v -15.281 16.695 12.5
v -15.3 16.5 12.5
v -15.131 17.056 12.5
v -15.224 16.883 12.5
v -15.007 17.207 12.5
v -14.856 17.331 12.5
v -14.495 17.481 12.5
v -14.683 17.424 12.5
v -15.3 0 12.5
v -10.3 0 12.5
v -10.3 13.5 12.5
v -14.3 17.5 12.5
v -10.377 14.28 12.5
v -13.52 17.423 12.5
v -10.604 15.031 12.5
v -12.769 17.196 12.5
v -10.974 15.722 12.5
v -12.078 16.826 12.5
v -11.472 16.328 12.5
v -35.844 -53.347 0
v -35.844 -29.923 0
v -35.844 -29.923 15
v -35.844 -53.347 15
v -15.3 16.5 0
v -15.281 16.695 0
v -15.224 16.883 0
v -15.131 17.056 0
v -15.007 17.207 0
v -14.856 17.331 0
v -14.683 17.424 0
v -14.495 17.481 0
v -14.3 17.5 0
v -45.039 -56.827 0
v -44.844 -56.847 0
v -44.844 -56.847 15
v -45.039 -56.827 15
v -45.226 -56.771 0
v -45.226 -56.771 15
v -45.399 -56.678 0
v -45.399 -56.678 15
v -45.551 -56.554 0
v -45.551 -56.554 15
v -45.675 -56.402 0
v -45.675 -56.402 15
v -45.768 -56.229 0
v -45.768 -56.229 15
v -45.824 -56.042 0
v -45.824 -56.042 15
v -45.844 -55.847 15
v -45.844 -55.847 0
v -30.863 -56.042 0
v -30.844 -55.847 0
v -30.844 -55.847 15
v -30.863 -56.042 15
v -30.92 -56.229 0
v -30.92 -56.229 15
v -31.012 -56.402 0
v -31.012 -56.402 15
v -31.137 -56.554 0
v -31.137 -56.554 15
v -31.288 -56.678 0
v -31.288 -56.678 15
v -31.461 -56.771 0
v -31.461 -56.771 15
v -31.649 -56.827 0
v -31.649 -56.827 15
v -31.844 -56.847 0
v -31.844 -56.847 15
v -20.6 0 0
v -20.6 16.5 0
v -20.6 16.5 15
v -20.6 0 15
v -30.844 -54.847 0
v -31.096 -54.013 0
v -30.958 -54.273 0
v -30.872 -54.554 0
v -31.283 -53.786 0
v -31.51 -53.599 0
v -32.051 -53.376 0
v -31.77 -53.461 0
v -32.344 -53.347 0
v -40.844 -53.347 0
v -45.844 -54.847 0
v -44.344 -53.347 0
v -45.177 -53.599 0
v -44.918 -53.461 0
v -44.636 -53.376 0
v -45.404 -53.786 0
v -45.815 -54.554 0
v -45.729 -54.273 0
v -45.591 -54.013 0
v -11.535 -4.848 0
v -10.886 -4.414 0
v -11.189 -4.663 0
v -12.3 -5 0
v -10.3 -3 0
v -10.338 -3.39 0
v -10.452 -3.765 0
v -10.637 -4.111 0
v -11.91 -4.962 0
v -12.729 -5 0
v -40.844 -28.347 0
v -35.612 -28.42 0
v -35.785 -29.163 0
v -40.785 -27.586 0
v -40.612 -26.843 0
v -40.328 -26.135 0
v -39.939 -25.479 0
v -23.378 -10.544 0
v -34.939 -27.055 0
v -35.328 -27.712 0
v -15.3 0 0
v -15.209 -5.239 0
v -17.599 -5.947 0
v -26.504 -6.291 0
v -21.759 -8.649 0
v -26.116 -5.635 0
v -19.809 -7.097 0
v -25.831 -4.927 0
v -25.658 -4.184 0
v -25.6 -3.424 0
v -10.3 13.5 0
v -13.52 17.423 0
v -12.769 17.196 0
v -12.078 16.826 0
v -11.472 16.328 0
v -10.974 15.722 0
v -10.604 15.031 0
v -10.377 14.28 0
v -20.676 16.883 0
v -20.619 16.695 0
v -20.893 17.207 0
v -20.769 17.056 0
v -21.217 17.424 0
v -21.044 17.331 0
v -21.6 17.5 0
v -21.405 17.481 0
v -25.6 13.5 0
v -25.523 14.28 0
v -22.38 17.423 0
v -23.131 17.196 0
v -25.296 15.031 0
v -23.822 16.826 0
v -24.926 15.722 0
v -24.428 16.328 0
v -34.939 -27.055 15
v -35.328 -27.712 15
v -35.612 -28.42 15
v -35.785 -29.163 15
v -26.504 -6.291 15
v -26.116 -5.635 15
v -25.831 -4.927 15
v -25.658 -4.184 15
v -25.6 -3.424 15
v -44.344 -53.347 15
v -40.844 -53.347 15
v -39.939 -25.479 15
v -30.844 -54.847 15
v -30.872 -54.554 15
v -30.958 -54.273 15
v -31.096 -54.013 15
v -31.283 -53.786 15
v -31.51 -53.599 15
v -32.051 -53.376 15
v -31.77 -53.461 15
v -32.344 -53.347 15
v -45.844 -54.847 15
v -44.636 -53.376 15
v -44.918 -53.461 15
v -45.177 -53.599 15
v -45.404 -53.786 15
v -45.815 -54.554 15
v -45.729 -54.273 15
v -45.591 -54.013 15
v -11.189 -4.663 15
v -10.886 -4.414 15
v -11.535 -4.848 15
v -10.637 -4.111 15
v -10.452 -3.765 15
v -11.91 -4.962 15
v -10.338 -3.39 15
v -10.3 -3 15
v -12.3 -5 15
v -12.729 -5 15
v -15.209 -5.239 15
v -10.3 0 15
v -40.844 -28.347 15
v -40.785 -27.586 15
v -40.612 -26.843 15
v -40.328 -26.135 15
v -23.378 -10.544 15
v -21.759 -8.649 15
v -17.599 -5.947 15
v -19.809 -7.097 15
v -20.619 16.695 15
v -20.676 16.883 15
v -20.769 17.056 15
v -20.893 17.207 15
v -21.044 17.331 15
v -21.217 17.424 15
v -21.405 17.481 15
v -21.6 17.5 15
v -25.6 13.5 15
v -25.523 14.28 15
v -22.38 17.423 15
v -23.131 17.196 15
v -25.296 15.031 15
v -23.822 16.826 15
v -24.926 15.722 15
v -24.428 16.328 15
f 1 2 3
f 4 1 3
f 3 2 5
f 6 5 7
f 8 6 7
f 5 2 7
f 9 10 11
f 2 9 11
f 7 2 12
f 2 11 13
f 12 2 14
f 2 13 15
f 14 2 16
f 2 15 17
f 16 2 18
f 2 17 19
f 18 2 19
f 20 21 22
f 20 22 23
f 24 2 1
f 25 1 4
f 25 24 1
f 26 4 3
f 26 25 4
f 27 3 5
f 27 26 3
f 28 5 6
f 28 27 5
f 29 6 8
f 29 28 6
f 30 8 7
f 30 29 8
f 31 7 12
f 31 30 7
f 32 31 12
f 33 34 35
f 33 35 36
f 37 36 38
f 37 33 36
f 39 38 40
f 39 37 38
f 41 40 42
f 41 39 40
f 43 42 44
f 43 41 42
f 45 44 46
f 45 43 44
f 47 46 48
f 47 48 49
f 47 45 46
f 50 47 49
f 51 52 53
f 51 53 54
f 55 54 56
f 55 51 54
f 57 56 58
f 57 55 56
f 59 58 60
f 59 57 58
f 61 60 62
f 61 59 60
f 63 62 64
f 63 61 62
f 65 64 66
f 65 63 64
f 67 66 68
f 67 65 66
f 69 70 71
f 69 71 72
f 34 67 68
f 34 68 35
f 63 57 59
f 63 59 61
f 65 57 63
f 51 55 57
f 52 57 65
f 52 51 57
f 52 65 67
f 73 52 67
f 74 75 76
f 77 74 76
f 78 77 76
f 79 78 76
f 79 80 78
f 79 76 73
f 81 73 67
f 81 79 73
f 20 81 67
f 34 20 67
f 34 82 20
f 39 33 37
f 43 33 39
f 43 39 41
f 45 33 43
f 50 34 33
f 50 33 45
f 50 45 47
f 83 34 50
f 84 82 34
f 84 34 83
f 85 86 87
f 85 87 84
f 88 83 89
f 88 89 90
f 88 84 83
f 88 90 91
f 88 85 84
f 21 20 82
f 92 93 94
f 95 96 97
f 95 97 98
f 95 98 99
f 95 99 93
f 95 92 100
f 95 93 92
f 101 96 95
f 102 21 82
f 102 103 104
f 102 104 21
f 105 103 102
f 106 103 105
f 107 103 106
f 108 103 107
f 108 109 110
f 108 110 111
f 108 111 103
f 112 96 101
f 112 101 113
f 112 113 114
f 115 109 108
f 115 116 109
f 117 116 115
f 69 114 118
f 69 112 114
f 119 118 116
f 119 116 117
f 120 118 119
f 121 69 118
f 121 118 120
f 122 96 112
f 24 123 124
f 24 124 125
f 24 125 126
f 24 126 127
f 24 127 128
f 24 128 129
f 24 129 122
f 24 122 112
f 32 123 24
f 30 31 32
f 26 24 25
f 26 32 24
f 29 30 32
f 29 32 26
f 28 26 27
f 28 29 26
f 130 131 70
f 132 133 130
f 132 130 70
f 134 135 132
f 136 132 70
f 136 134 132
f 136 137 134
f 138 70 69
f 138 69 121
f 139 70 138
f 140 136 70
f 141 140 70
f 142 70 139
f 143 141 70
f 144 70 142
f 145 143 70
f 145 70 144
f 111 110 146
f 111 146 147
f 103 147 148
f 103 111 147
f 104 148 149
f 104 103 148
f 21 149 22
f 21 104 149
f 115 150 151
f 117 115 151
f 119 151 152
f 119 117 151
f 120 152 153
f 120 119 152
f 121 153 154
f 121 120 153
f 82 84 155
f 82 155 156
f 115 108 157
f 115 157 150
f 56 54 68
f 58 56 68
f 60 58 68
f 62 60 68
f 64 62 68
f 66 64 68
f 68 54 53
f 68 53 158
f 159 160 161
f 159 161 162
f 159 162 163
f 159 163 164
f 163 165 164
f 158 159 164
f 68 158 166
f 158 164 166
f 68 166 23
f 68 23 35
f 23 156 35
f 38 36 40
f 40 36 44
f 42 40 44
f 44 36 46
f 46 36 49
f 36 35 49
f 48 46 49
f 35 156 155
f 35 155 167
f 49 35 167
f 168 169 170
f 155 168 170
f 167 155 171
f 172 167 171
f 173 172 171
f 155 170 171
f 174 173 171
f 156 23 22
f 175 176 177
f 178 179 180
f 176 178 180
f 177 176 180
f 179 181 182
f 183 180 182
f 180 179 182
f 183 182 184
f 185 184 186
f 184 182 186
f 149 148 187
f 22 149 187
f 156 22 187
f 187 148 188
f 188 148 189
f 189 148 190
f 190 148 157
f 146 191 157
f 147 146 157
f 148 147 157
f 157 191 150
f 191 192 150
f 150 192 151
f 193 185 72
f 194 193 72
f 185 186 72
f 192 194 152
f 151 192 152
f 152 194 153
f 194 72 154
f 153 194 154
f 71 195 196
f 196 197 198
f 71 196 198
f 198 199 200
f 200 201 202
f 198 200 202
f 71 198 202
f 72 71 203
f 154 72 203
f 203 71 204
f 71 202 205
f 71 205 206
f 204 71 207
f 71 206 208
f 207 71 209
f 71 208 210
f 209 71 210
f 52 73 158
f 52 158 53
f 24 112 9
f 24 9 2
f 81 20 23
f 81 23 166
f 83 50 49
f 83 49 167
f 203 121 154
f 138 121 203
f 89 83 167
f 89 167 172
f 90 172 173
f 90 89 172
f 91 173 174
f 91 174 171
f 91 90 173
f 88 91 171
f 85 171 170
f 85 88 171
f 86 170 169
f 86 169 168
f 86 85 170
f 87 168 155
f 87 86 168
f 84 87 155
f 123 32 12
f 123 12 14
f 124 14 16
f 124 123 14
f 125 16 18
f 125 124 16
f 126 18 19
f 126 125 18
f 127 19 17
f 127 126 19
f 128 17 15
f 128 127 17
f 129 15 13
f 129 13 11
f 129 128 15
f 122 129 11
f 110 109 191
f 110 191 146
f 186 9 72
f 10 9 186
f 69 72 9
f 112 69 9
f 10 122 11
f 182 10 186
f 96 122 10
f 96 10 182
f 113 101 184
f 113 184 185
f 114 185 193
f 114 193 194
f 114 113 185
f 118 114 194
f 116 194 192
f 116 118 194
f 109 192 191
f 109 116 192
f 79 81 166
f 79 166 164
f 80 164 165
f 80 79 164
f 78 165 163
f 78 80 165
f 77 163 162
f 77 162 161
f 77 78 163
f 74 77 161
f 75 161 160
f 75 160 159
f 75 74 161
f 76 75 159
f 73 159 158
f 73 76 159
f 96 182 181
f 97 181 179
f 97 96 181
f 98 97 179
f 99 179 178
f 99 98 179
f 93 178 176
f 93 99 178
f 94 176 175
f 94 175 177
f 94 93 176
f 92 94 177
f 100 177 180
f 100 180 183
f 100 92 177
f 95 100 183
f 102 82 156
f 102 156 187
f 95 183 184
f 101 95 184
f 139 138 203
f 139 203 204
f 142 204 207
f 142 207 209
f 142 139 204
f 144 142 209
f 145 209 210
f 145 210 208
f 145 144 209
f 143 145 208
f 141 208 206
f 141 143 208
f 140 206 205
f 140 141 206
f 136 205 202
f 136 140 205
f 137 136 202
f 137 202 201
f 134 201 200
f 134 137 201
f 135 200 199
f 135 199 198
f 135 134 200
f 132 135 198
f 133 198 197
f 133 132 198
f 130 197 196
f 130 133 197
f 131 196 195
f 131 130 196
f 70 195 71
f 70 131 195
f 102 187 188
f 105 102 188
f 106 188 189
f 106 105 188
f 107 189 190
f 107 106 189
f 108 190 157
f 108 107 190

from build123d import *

# Parameters (mm, degrees)
F1_DEPTH = 15
F4_W     = 17.5
F4_H     = 2.5
F5_DEPTH = 5.7


with BuildPart() as f1:
    # F0 (on Top) → F1 (new body)
    with BuildSketch(Plane.XY):
        with BuildLine():
            Line((0, 16.5), (0, 0))
            Line((0, 0), (-5.3, 0))
            Line((-5.3, 0), (-5.3, 16.5))
            ThreePointArc((-5.3, 16.5), (-5.592893, 17.207107), (-6.3, 17.5))
            ThreePointArc((-6.3, 17.5), (-9.128427, 16.328427), (-10.3, 13.5))
            Line((-10.3, 13.5), (-10.3, -3))
            ThreePointArc((-10.3, -3), (-9.714214, -4.414214), (-8.3, -5))
            Line((-8.3, -5), (-7.871245, -5))
            ThreePointArc((-7.871245, -5), (-1.868513, -6.468859), (2.777732, -10.543506))
            Line((2.777732, -10.543506), (14.339411, -27.055295))
            ThreePointArc((14.339411, -27.055295), (15.012235, -28.419648), (15.243651, -29.923177))
            Line((15.243651, -29.923177), (15.243651, -53.346683))
            Line((15.243651, -53.346683), (11.743651, -53.346683))
            ThreePointArc((11.743651, -53.346683), (10.682991, -53.786023), (10.243651, -54.846683))
            Line((10.243651, -54.846683), (10.243651, -55.846683))
            ThreePointArc((10.243651, -55.846683), (10.536544, -56.55379), (11.243651, -56.846683))
            Line((11.243651, -56.846683), (24.243651, -56.846683))
            ThreePointArc((24.243651, -56.846683), (24.950757, -56.55379), (25.243651, -55.846683))
            Line((25.243651, -55.846683), (25.243651, -54.846683))
            ThreePointArc((25.243651, -54.846683), (24.804311, -53.786023), (23.743651, -53.346683))
            Line((23.743651, -53.346683), (20.243651, -53.346683))
            Line((20.243651, -53.346683), (20.243651, -28.346683))
            ThreePointArc((20.243651, -28.346683), (20.012235, -26.843154), (19.339411, -25.478801))
            Line((19.339411, -25.478801), (5.90424, -6.291388))
            ThreePointArc((5.90424, -6.291388), (5.231415, -4.927035), (5, -3.423506))
            Line((5, -3.423506), (5, 13.5))
            ThreePointArc((5, 13.5), (3.828427, 16.328427), (1, 17.5))
            ThreePointArc((1, 17.5), (0.292893, 17.207107), (0, 16.5))
        make_face()
    extrude(amount=F1_DEPTH)


with BuildPart() as f2_1:
    # F2: instance of F1
    add(f1.part.mirror(Plane(origin=(-10.3, 5.25, 7.5), x_dir=(0, -1, 0), z_dir=(-1, 0, 0))))

    # F4 (on face) → F5 (cut)
    with BuildSketch(Plane.YZ.offset(-10.3)):
        with Locations((8.75, 13.75)):
            Rectangle(F4_W, F4_H)
    extrude(amount=-F5_DEPTH, mode=Mode.SUBTRACT)


solid = f2_1.part
